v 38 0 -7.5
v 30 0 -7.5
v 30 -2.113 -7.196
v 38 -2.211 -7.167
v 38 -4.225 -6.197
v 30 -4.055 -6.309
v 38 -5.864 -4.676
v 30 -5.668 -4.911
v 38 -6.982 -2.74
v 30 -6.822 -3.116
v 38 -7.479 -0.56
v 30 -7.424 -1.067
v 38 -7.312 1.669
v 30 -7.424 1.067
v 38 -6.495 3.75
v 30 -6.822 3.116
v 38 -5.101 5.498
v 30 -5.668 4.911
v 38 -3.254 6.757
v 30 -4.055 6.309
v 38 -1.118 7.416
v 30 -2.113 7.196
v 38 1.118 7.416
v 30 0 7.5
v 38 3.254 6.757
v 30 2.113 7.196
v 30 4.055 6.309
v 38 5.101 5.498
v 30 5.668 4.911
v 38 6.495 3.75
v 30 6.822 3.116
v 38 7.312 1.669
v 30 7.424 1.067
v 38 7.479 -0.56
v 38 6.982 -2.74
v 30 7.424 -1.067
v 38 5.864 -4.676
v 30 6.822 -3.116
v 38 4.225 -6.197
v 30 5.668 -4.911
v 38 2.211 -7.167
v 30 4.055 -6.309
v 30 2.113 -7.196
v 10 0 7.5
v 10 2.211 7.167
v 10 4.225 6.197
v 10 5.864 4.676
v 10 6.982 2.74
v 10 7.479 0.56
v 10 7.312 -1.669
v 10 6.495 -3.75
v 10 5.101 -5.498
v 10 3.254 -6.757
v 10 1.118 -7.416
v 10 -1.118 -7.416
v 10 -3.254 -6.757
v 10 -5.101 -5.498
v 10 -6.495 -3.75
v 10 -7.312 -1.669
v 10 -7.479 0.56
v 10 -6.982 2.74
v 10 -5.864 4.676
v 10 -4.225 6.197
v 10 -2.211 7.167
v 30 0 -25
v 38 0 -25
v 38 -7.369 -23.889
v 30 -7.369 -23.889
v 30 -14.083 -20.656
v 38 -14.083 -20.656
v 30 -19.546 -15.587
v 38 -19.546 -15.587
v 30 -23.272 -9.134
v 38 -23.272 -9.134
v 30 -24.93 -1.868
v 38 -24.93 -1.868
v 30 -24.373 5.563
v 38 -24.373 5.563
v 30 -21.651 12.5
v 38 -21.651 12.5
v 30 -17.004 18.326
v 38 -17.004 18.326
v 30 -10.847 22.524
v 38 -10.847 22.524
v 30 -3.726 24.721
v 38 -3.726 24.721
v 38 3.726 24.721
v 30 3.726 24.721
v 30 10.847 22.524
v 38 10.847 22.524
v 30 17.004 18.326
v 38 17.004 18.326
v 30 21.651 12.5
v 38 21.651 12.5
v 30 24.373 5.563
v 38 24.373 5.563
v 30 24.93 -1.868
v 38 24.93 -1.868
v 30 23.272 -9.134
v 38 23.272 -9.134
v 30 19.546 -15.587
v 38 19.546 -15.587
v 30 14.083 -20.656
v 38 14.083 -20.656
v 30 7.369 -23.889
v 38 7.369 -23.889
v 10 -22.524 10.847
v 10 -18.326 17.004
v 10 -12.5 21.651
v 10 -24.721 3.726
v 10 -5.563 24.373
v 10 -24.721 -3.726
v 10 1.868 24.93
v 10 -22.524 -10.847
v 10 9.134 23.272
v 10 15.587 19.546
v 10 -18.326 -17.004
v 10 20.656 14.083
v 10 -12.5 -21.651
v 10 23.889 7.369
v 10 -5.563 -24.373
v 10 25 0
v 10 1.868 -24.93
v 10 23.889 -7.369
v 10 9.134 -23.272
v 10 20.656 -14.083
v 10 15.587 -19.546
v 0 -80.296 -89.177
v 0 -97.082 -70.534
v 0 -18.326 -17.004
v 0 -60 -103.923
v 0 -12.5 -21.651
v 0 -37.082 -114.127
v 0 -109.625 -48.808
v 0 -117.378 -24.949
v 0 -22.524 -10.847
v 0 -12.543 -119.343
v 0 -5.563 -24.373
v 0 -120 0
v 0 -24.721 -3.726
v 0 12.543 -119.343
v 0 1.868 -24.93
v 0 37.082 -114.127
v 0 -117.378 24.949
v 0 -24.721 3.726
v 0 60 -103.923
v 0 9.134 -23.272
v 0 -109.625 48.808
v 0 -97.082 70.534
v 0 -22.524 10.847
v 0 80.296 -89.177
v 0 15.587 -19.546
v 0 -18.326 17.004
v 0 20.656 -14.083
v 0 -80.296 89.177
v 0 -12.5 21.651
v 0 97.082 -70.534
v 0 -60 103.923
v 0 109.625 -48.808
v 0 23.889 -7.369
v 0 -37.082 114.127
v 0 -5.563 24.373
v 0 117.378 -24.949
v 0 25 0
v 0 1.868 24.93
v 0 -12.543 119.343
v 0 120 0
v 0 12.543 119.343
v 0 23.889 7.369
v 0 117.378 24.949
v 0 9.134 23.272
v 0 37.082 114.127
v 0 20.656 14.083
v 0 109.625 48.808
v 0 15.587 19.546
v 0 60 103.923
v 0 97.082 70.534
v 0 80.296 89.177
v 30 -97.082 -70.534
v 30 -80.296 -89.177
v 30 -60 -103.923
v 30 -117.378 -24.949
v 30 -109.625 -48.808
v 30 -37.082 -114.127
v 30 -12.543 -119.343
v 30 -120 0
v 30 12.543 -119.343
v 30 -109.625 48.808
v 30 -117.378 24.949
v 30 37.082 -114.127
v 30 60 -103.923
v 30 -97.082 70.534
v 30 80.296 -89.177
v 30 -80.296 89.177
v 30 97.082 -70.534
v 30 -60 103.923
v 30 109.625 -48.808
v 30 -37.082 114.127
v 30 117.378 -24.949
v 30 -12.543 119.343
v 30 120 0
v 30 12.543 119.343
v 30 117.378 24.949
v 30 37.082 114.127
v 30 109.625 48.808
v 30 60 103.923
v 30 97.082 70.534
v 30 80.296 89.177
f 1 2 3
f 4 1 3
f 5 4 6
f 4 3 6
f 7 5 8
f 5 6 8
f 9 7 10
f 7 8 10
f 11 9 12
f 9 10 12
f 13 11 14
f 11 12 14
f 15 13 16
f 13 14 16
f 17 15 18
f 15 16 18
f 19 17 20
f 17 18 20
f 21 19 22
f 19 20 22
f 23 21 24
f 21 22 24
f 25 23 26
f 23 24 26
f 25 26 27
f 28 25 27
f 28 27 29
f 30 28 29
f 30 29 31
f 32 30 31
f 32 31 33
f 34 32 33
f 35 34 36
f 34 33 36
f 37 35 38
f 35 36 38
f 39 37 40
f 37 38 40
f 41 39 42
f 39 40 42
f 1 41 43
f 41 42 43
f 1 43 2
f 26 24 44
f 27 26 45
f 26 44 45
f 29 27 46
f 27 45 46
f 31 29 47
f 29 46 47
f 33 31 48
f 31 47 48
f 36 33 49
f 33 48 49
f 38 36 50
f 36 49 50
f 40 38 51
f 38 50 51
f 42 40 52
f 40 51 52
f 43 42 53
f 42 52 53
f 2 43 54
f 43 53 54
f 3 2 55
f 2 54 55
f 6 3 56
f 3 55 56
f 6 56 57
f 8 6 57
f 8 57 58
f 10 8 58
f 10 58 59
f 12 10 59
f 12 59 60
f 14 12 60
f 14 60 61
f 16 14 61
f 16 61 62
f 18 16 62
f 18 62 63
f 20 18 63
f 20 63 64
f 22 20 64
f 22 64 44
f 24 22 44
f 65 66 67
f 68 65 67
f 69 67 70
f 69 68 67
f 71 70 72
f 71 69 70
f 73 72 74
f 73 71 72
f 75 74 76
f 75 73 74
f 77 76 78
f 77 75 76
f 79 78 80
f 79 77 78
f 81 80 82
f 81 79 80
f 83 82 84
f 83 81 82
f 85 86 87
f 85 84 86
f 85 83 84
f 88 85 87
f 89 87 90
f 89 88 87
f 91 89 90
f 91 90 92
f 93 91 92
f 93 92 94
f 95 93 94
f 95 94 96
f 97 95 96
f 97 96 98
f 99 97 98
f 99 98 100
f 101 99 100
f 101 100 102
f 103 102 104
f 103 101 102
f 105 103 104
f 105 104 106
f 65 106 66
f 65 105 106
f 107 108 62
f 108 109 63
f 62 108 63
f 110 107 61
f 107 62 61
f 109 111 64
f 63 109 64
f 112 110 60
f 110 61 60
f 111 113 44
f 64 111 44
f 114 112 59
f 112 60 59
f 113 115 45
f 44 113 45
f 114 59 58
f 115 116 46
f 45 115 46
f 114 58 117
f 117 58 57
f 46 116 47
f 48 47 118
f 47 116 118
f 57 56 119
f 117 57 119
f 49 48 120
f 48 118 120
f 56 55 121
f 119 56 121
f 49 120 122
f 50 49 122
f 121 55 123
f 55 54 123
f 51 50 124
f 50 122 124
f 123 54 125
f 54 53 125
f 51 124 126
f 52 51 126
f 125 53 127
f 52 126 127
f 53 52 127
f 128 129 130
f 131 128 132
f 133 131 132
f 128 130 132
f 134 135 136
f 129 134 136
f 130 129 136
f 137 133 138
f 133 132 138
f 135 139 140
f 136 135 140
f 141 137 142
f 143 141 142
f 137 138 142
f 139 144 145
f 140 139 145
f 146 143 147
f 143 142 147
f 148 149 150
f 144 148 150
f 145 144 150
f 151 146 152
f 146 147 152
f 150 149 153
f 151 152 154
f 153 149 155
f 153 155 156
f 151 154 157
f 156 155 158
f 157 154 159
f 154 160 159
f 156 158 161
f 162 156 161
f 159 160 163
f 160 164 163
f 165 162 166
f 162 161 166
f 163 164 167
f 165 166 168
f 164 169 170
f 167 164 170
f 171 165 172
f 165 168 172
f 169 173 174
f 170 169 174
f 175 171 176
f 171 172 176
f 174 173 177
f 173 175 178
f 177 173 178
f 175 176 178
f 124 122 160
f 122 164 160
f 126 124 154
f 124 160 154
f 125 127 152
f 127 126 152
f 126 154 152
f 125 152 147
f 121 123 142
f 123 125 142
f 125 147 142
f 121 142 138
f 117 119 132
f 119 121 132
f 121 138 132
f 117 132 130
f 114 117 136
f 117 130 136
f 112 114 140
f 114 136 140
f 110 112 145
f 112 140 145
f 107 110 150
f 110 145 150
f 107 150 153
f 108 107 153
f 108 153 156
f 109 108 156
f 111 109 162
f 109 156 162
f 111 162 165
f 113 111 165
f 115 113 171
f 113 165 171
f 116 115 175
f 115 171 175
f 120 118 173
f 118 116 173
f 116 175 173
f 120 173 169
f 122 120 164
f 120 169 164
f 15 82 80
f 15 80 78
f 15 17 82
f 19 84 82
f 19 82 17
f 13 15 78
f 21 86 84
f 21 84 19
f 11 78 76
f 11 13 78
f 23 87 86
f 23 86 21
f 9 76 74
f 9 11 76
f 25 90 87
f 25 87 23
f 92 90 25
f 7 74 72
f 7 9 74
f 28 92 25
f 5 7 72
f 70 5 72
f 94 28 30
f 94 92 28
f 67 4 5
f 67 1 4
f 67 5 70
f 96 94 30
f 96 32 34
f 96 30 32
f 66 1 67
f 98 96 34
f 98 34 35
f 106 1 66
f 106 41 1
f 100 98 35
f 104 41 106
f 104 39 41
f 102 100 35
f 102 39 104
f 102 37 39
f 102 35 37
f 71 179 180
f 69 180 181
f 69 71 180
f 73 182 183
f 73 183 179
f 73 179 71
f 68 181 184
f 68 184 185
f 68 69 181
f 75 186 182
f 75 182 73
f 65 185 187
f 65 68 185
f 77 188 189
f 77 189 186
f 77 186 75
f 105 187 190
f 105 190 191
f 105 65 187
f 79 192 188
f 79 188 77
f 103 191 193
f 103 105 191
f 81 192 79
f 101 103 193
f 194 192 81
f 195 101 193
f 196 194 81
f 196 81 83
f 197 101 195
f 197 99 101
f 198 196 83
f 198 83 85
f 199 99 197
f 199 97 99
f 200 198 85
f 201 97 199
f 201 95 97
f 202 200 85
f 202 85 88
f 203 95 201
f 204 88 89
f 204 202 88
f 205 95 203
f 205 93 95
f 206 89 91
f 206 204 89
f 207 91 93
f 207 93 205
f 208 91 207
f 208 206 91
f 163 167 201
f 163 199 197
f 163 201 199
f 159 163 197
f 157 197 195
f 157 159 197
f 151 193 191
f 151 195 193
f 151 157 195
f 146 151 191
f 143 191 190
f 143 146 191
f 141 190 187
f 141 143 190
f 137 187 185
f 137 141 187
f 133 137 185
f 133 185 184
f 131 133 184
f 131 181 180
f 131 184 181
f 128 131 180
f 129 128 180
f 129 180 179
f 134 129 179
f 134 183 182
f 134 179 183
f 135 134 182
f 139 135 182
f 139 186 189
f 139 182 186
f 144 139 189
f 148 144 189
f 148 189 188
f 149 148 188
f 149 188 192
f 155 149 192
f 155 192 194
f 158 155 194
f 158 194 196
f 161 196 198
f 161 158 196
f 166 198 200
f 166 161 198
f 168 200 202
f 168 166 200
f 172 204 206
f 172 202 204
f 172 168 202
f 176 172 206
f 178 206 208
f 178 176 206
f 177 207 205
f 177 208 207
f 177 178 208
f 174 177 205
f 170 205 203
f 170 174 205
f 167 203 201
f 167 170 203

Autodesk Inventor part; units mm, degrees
ref_plane "YZ Plane" through (0, 0, 0) normal (1, 0, 0) x (0, 1, 0)
ref_plane "XZ Plane" through (0, 0, 0) normal (0, 1, 0) x (-1, 0, 0)
ref_plane "XY Plane" through (0, 0, 0) normal (0, 0, 1) x (1, 0, 0)
sketch "Sketch1" plane through (0, 0, 0) normal (1, 0, 0) x (0, 1, 0)
  circle A0 centre (0, 0) radius 120
  circle A1 centre (0, 0) radius 25
  circle A2 centre (0, 0) radius 7.5
  dimension "d0" = 240
  dimension "d1" = 50
  dimension "d2" = 15
extrude "Extrusion1" add sketch "Sketch1" along normal blind 30 contours A0
sketch "Sketch2" plane through (30, 0, 0) normal (1, 0, 0) x (0, 0, -1)
  circle A0 centre (0, 0) radius 25
extrude "Extrusion2" add sketch "Sketch2" against normal blind 20
sketch "Sketch3" plane through (10, 0, 0) normal (-1, 0, 0) x (0, 0, 1)
  circle A0 centre (0, 0) radius 7.5
  dimension "d7" = 15
extrude "Extrusion3" cut sketch "Sketch3" against normal blind 20
sketch "Sketch4" plane through (30, 0, 0) normal (1, 0, 0) x (0, 0, -1)
  circle A0 centre (0, 0) radius 7.5 projected
  circle A1 centre (0, 0) radius 25
  dimension "d10" = 50
extrude "Extrusion4" add sketch "Sketch4" along normal blind 8
properties part number "wheel"
